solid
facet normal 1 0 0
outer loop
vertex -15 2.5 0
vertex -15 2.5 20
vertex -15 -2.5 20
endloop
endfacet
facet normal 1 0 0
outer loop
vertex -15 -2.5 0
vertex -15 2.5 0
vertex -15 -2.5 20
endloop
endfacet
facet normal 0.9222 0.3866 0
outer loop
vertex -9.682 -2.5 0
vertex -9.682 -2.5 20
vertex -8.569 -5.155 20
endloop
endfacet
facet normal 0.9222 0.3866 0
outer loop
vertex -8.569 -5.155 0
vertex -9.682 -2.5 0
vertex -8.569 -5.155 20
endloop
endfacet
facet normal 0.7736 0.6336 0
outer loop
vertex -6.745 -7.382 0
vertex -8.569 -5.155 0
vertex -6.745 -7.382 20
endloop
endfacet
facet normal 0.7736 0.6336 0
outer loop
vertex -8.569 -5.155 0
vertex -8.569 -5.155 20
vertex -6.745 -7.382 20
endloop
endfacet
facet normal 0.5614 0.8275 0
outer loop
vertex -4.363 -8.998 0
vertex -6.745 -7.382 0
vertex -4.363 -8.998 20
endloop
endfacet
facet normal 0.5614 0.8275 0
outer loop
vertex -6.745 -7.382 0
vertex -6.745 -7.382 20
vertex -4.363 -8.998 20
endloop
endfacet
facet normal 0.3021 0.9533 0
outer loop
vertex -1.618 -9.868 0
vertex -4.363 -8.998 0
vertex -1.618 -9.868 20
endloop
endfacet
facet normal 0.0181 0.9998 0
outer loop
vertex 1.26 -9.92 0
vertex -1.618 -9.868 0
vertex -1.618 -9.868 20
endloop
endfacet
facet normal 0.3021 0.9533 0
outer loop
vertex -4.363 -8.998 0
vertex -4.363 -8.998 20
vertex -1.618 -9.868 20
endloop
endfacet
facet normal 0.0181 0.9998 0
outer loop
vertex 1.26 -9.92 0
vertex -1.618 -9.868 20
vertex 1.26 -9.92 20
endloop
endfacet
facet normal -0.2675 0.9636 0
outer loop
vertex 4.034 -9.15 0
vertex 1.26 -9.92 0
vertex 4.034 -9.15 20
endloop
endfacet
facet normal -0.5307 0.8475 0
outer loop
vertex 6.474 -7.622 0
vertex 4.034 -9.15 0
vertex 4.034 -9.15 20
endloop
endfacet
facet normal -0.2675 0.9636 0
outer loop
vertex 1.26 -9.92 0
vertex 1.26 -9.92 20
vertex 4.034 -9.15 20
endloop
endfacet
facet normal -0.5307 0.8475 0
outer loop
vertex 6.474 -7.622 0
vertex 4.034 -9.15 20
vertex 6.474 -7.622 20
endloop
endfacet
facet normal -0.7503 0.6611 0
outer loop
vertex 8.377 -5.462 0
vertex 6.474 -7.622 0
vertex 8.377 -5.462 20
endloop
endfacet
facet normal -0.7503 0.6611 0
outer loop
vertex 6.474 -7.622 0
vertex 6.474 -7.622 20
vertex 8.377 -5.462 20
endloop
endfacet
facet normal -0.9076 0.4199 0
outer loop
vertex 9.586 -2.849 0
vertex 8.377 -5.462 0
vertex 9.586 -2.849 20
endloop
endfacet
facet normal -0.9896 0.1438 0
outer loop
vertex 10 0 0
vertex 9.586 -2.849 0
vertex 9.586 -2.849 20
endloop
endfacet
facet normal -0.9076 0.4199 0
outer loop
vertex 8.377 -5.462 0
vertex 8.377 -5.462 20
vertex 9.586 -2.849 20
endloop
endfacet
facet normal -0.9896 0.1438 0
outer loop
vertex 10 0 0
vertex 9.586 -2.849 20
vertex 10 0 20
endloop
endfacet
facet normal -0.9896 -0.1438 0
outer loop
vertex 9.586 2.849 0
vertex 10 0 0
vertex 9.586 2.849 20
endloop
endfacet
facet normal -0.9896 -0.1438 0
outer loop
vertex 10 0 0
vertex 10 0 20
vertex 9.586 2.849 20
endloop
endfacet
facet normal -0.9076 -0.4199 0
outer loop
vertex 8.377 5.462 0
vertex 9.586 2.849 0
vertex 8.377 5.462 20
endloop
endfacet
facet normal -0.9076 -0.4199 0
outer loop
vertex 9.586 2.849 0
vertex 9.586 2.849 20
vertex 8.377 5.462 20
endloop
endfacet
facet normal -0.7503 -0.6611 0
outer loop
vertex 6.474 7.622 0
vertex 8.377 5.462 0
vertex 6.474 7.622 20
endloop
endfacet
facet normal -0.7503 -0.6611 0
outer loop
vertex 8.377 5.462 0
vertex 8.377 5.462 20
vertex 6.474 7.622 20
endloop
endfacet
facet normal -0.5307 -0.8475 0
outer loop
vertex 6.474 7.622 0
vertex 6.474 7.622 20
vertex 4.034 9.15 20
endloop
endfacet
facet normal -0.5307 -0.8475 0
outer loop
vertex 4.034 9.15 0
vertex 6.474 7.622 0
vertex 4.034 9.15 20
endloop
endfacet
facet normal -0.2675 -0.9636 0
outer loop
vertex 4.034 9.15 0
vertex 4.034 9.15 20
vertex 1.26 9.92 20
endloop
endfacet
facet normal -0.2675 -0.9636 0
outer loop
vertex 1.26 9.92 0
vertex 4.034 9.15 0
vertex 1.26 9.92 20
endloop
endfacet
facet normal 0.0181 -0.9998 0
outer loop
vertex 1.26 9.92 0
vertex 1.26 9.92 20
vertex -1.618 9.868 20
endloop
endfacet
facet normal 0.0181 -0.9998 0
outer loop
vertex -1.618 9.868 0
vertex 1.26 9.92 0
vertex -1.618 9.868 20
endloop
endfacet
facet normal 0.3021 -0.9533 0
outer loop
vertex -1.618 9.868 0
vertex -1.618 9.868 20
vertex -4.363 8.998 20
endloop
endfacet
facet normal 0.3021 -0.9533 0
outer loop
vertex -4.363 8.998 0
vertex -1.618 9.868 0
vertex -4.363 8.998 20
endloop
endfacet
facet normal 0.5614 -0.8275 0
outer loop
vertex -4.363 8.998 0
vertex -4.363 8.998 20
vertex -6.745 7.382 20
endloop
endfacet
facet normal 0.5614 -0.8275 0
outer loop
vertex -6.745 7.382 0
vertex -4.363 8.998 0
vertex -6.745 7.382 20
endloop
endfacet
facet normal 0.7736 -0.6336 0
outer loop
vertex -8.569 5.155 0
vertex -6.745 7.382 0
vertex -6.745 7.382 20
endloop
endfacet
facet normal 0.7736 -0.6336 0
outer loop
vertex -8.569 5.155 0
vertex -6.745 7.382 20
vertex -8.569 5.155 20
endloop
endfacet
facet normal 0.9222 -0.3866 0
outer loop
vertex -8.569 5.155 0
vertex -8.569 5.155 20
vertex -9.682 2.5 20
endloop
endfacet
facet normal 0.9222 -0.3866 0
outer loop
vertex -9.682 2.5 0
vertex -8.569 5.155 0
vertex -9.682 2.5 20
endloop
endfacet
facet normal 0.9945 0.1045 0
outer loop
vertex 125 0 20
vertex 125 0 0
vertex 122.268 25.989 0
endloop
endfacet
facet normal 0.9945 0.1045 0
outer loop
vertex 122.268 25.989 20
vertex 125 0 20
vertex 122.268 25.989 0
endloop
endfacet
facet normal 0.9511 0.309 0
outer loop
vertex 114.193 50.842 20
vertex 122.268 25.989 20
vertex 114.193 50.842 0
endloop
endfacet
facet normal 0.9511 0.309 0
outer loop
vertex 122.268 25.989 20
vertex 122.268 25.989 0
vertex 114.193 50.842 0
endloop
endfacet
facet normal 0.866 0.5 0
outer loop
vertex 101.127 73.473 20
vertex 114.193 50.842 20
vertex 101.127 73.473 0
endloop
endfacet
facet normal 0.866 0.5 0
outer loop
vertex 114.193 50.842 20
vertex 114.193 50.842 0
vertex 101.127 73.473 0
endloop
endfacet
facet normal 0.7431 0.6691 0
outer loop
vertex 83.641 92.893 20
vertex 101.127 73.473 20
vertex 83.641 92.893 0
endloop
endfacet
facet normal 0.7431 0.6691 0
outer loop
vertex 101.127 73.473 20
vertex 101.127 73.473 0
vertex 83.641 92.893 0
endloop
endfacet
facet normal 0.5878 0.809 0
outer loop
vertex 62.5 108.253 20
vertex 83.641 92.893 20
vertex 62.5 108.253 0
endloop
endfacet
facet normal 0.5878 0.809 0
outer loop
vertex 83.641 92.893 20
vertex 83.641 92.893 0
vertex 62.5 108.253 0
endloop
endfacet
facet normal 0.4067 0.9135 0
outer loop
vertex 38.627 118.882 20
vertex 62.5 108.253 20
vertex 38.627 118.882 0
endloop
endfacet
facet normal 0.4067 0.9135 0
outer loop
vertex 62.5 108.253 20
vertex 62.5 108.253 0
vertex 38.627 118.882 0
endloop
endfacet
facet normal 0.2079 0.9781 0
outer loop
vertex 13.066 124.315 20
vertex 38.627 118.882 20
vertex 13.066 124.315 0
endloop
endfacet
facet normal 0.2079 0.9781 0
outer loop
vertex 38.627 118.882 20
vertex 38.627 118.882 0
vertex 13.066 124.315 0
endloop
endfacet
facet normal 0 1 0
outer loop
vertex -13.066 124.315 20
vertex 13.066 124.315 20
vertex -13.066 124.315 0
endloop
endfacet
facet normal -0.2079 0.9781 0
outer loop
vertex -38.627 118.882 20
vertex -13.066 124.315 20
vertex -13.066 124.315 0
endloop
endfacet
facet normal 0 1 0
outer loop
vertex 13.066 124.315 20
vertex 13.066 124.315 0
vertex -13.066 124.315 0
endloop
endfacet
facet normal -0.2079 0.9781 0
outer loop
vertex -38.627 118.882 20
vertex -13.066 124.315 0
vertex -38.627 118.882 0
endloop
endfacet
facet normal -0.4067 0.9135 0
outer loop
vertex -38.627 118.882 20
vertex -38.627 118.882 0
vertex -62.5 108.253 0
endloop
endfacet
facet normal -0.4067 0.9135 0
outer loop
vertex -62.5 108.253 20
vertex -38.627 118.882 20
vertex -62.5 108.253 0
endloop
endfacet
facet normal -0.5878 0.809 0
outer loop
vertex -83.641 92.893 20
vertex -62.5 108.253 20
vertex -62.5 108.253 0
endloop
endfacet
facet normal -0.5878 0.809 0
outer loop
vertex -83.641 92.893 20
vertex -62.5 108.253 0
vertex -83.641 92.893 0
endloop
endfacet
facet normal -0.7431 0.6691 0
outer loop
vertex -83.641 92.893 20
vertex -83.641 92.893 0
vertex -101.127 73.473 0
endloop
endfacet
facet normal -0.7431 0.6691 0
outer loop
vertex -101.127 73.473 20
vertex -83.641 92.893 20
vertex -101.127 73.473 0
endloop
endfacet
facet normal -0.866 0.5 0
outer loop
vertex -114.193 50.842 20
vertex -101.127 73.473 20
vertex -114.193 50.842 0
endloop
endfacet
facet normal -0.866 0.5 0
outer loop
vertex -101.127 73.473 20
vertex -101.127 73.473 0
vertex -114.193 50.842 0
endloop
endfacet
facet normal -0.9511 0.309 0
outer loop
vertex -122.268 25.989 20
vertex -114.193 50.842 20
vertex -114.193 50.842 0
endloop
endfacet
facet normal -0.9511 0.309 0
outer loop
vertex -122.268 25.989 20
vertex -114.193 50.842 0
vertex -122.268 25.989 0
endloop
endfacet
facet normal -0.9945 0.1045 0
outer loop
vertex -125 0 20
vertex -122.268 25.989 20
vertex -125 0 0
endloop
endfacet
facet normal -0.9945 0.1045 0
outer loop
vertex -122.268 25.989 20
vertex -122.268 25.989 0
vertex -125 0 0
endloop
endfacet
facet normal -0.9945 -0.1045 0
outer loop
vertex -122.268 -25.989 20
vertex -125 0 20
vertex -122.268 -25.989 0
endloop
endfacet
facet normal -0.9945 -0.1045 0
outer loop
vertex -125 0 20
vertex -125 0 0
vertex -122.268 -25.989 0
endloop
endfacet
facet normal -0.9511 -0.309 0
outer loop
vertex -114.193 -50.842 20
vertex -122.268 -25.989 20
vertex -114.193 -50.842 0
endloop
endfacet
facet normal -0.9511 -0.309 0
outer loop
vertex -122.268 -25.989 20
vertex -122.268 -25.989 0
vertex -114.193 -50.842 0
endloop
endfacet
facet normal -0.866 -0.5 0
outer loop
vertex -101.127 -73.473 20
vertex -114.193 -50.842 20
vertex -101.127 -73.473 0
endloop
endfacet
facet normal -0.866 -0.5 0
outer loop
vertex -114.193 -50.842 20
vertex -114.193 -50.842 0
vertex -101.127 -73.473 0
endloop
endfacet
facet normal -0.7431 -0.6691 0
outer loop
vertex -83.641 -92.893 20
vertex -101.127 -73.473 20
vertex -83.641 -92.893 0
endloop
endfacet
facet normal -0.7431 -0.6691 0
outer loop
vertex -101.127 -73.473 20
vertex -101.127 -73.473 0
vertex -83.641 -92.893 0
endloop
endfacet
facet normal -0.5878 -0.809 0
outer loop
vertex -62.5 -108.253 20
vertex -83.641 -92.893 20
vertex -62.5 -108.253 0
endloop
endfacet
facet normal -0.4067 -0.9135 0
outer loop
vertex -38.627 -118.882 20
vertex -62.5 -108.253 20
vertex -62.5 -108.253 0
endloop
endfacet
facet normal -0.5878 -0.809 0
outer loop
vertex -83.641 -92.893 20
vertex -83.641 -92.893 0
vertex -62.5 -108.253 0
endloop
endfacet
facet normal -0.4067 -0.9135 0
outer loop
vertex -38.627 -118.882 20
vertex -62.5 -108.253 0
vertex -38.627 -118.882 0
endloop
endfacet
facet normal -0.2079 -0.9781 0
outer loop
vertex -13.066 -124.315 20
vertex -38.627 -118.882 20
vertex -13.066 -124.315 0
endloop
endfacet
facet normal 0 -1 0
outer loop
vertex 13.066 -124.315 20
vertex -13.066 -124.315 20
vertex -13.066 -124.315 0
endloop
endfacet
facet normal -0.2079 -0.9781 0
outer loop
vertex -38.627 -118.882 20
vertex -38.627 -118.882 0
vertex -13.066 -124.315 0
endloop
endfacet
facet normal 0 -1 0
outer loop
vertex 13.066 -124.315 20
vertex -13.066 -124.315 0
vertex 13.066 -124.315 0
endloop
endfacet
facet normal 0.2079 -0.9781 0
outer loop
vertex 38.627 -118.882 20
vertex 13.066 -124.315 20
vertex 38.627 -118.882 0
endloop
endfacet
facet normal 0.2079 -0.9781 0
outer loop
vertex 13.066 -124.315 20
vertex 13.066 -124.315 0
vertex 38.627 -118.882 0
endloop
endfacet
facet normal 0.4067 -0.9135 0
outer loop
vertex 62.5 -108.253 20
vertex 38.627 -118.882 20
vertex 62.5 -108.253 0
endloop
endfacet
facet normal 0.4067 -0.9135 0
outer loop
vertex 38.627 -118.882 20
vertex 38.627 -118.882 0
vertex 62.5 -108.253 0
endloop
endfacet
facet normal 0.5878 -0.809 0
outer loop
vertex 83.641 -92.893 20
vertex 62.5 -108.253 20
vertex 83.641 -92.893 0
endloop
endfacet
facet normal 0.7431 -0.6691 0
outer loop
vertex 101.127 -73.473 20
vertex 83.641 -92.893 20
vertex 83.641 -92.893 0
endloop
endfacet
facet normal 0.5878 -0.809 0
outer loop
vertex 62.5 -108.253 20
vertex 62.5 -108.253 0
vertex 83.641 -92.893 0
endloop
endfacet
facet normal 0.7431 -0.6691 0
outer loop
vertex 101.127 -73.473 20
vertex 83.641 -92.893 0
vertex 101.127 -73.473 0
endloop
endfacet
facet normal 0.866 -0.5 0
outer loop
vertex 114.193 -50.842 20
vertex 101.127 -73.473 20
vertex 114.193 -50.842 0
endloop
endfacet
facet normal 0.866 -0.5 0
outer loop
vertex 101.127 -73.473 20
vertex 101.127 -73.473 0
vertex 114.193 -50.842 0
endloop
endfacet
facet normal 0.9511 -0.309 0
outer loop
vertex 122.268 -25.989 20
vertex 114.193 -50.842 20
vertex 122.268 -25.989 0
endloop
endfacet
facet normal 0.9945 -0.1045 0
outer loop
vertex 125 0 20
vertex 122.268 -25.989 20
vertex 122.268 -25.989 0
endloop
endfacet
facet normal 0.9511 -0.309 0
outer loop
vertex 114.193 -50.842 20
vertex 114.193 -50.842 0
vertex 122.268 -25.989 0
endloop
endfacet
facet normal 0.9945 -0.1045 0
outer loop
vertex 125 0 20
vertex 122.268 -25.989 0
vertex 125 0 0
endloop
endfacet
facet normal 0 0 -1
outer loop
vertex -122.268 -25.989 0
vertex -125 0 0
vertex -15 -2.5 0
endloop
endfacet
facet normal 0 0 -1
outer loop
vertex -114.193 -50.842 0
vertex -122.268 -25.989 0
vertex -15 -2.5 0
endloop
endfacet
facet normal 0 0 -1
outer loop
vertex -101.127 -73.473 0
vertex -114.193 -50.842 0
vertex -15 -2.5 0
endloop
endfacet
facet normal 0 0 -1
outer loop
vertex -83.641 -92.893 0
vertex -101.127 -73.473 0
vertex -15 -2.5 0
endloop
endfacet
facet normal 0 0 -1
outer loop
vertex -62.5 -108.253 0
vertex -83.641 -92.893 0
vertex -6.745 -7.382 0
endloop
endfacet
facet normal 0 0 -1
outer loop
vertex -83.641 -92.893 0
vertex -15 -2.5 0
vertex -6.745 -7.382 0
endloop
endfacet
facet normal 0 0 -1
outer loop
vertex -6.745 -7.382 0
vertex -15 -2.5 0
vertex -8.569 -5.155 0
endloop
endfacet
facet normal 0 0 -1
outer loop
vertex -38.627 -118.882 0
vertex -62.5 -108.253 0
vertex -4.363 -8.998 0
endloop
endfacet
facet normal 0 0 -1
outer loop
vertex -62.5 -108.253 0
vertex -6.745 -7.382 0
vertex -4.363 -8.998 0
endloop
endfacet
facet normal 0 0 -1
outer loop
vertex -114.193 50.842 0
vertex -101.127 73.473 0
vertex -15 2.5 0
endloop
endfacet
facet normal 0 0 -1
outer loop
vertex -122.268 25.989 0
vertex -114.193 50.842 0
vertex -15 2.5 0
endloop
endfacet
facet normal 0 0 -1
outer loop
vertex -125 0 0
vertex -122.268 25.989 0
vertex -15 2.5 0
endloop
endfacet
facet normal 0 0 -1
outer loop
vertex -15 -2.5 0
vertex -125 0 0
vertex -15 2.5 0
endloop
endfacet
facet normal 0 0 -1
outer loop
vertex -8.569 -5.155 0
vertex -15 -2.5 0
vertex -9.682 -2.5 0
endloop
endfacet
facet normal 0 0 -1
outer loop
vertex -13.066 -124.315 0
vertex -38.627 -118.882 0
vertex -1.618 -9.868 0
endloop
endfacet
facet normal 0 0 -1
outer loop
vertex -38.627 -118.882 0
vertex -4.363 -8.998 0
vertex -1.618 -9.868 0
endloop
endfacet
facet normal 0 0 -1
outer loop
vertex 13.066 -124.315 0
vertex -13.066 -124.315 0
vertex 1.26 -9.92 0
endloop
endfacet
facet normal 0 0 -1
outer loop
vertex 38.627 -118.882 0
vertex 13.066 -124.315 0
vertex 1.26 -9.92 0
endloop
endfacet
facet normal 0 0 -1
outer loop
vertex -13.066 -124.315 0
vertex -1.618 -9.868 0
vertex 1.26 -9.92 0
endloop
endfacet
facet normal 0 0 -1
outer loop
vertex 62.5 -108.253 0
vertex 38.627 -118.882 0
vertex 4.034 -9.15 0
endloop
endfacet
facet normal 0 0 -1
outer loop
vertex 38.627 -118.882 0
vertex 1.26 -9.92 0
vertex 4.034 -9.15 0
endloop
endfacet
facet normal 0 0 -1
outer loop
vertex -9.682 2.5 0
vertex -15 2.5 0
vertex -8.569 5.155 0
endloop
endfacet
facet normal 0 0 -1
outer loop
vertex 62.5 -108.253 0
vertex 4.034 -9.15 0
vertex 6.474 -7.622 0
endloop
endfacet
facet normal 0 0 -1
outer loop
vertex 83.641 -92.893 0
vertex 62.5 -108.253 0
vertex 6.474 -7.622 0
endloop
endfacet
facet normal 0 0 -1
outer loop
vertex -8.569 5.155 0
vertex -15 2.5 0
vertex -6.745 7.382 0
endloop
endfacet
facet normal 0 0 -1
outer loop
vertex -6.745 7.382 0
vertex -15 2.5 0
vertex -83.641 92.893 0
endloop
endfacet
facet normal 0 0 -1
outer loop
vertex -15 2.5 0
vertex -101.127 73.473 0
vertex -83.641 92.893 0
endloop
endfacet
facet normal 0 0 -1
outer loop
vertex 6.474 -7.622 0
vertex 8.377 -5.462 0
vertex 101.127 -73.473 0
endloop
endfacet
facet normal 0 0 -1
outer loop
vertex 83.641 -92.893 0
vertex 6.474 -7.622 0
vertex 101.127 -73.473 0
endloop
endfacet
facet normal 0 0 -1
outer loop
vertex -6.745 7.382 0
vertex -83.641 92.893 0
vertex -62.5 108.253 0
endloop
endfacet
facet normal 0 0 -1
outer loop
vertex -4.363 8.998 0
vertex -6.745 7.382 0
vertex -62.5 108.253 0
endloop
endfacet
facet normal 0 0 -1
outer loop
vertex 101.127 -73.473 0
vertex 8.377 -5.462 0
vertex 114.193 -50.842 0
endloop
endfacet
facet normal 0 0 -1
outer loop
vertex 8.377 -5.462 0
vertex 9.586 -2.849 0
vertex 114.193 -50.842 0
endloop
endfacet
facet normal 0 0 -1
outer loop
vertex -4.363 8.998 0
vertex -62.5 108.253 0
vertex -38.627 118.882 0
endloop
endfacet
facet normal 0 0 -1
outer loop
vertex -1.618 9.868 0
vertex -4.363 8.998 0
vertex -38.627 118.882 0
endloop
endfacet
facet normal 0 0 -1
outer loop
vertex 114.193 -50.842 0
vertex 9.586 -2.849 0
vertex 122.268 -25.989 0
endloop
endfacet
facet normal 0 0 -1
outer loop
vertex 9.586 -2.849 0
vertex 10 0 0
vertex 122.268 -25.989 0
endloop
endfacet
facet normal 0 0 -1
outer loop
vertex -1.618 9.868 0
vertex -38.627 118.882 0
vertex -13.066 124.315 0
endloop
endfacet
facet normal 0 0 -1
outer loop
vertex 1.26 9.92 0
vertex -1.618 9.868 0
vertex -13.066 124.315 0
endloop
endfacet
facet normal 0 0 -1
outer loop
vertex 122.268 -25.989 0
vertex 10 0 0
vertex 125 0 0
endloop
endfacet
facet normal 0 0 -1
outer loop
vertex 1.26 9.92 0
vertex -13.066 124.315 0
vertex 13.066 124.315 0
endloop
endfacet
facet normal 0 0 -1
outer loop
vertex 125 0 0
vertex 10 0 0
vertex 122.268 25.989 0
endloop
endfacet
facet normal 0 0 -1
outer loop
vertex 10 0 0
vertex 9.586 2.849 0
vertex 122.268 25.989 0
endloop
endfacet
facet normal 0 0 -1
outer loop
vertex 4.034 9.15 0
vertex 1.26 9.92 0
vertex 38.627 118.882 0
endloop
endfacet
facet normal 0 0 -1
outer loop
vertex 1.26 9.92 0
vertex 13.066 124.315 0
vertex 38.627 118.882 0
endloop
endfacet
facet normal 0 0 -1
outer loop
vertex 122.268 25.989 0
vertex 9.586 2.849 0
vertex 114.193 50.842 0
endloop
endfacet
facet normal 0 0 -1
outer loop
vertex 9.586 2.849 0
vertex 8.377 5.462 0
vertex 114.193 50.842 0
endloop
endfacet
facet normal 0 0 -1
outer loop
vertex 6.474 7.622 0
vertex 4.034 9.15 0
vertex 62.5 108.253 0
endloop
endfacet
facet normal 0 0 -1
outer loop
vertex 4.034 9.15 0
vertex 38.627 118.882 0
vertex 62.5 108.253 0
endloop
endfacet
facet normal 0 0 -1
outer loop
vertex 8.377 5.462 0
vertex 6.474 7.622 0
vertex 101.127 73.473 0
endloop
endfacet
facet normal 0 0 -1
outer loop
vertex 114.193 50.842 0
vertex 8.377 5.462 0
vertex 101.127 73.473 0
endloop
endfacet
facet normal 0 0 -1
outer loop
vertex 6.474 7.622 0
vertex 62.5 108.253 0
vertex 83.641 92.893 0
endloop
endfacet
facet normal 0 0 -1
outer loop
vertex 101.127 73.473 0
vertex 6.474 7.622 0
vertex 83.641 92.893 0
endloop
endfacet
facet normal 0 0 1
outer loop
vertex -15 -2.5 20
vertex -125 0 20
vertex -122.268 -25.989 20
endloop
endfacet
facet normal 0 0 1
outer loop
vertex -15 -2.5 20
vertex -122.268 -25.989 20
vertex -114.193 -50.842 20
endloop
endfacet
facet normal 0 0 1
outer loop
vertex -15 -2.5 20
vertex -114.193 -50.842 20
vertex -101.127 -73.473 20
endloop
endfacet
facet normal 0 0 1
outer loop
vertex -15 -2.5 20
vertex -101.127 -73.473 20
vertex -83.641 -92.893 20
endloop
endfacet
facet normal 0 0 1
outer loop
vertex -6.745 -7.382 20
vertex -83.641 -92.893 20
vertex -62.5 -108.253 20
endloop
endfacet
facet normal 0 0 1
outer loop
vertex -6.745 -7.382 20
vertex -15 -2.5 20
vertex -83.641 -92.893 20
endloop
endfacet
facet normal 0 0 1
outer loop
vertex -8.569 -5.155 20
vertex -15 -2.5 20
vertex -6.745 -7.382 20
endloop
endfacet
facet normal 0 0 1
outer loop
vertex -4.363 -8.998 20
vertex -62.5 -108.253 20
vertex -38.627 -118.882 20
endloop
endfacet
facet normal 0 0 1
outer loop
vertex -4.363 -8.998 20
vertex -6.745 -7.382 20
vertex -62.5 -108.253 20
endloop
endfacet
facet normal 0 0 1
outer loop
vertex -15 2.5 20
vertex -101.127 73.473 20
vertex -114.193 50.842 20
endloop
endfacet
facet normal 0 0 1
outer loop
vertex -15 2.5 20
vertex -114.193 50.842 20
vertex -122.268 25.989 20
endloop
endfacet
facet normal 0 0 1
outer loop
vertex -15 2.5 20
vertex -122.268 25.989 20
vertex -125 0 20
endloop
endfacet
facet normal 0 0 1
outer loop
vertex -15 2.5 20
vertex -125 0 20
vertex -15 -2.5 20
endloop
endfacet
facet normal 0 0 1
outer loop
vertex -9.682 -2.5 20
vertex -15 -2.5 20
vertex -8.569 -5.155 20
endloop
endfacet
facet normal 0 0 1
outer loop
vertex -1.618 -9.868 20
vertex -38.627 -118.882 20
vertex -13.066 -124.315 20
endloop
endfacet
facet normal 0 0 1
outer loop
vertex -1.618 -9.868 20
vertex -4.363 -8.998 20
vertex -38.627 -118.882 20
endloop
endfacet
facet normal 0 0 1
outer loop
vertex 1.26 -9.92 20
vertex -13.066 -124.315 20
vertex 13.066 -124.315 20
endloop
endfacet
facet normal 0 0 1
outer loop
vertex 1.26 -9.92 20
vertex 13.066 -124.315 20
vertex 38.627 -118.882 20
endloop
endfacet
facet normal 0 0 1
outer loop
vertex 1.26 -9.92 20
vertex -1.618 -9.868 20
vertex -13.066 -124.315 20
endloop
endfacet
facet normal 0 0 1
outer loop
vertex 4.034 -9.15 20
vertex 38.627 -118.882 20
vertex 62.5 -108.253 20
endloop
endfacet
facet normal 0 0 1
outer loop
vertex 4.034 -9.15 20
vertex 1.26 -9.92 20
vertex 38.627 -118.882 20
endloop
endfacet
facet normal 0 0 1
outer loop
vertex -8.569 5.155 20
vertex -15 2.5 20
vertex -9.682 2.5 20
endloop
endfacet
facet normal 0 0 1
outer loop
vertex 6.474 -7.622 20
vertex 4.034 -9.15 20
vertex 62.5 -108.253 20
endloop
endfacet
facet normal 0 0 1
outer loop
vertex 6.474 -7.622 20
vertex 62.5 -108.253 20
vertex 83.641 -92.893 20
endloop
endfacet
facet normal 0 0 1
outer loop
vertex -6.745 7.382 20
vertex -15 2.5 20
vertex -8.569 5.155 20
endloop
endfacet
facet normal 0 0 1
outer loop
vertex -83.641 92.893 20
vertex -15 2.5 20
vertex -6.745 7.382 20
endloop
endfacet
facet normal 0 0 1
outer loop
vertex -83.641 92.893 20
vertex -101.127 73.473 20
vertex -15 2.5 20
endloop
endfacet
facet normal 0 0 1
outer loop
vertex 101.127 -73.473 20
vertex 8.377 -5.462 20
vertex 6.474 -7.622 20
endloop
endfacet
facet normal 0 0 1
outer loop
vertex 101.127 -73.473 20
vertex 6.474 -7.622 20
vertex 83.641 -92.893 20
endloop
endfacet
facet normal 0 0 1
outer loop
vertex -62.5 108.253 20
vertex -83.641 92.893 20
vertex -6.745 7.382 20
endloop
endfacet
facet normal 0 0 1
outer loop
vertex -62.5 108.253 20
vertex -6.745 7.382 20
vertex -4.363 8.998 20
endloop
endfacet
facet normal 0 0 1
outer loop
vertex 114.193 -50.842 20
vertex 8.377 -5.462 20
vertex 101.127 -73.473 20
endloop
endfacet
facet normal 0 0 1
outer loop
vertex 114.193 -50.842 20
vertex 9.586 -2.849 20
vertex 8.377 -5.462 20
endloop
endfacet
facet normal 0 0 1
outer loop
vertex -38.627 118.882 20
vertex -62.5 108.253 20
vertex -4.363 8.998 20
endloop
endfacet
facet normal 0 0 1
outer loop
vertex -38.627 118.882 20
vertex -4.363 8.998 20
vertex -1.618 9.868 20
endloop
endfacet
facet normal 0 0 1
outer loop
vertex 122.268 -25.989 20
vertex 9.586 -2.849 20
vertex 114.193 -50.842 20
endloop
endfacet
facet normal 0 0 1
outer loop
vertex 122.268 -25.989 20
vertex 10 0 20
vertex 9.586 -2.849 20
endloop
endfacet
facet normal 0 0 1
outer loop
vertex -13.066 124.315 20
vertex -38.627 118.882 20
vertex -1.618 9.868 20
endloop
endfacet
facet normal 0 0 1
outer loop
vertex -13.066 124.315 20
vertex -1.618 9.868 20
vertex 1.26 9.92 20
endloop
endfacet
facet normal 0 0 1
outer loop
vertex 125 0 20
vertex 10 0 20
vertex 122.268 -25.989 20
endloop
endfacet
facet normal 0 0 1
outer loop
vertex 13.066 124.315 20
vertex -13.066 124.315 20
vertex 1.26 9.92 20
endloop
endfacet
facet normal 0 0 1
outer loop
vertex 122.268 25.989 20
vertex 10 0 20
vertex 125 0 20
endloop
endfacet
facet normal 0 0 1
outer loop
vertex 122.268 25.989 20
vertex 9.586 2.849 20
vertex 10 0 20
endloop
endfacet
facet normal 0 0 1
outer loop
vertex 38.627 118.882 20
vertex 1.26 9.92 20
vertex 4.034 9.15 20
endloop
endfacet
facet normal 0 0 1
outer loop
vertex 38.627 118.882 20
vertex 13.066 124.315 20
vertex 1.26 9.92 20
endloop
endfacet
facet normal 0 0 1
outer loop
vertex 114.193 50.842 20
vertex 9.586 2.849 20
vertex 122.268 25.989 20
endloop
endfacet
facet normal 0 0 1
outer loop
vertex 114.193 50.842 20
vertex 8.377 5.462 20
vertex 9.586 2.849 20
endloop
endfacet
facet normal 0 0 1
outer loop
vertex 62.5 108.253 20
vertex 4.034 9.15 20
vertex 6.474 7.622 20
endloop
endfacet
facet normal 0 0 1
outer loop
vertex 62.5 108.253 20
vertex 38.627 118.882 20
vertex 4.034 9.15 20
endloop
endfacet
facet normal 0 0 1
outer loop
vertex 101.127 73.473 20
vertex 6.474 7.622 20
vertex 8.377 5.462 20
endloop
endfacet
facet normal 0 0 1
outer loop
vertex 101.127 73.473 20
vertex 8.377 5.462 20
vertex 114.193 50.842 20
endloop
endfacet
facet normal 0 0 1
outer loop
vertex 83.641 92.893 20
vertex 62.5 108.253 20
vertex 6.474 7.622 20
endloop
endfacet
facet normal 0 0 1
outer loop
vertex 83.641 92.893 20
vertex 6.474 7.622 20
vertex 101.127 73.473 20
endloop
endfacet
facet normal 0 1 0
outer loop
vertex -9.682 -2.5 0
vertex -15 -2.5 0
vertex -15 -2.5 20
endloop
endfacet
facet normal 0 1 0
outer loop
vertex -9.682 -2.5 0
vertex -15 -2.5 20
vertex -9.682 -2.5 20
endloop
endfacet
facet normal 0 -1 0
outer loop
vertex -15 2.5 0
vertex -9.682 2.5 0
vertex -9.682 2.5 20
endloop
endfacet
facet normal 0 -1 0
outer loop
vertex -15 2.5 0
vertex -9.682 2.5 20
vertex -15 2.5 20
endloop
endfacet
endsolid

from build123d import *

# Parameters (mm, degrees)
SKETCH1_R           = 125
BOSS_EXTRUDE1_DEPTH = 20
CUT_EXTRUDE1_DEPTH  = 21


with BuildPart() as part:
    # Sketch1 → Boss-Extrude1 (new body)
    with BuildSketch(Plane.XY):
        Circle(SKETCH1_R)
    extrude(amount=BOSS_EXTRUDE1_DEPTH)

    # Sketch2 → Cut-Extrude1 (cut, through all)
    with BuildSketch(Plane.XY.offset(20)):
        with BuildLine():
            Line((-9.682458366, 2.5), (-15, 2.5))
            Line((-15, 2.5), (-15, -2.5))
            Line((-15, -2.5), (-9.682458366, -2.5))
            ThreePointArc((-9.682458366, -2.5), (10, 0), (-9.682458366, 2.5))
        make_face()
    extrude(amount=-CUT_EXTRUDE1_DEPTH, mode=Mode.SUBTRACT)


solid = part.part
